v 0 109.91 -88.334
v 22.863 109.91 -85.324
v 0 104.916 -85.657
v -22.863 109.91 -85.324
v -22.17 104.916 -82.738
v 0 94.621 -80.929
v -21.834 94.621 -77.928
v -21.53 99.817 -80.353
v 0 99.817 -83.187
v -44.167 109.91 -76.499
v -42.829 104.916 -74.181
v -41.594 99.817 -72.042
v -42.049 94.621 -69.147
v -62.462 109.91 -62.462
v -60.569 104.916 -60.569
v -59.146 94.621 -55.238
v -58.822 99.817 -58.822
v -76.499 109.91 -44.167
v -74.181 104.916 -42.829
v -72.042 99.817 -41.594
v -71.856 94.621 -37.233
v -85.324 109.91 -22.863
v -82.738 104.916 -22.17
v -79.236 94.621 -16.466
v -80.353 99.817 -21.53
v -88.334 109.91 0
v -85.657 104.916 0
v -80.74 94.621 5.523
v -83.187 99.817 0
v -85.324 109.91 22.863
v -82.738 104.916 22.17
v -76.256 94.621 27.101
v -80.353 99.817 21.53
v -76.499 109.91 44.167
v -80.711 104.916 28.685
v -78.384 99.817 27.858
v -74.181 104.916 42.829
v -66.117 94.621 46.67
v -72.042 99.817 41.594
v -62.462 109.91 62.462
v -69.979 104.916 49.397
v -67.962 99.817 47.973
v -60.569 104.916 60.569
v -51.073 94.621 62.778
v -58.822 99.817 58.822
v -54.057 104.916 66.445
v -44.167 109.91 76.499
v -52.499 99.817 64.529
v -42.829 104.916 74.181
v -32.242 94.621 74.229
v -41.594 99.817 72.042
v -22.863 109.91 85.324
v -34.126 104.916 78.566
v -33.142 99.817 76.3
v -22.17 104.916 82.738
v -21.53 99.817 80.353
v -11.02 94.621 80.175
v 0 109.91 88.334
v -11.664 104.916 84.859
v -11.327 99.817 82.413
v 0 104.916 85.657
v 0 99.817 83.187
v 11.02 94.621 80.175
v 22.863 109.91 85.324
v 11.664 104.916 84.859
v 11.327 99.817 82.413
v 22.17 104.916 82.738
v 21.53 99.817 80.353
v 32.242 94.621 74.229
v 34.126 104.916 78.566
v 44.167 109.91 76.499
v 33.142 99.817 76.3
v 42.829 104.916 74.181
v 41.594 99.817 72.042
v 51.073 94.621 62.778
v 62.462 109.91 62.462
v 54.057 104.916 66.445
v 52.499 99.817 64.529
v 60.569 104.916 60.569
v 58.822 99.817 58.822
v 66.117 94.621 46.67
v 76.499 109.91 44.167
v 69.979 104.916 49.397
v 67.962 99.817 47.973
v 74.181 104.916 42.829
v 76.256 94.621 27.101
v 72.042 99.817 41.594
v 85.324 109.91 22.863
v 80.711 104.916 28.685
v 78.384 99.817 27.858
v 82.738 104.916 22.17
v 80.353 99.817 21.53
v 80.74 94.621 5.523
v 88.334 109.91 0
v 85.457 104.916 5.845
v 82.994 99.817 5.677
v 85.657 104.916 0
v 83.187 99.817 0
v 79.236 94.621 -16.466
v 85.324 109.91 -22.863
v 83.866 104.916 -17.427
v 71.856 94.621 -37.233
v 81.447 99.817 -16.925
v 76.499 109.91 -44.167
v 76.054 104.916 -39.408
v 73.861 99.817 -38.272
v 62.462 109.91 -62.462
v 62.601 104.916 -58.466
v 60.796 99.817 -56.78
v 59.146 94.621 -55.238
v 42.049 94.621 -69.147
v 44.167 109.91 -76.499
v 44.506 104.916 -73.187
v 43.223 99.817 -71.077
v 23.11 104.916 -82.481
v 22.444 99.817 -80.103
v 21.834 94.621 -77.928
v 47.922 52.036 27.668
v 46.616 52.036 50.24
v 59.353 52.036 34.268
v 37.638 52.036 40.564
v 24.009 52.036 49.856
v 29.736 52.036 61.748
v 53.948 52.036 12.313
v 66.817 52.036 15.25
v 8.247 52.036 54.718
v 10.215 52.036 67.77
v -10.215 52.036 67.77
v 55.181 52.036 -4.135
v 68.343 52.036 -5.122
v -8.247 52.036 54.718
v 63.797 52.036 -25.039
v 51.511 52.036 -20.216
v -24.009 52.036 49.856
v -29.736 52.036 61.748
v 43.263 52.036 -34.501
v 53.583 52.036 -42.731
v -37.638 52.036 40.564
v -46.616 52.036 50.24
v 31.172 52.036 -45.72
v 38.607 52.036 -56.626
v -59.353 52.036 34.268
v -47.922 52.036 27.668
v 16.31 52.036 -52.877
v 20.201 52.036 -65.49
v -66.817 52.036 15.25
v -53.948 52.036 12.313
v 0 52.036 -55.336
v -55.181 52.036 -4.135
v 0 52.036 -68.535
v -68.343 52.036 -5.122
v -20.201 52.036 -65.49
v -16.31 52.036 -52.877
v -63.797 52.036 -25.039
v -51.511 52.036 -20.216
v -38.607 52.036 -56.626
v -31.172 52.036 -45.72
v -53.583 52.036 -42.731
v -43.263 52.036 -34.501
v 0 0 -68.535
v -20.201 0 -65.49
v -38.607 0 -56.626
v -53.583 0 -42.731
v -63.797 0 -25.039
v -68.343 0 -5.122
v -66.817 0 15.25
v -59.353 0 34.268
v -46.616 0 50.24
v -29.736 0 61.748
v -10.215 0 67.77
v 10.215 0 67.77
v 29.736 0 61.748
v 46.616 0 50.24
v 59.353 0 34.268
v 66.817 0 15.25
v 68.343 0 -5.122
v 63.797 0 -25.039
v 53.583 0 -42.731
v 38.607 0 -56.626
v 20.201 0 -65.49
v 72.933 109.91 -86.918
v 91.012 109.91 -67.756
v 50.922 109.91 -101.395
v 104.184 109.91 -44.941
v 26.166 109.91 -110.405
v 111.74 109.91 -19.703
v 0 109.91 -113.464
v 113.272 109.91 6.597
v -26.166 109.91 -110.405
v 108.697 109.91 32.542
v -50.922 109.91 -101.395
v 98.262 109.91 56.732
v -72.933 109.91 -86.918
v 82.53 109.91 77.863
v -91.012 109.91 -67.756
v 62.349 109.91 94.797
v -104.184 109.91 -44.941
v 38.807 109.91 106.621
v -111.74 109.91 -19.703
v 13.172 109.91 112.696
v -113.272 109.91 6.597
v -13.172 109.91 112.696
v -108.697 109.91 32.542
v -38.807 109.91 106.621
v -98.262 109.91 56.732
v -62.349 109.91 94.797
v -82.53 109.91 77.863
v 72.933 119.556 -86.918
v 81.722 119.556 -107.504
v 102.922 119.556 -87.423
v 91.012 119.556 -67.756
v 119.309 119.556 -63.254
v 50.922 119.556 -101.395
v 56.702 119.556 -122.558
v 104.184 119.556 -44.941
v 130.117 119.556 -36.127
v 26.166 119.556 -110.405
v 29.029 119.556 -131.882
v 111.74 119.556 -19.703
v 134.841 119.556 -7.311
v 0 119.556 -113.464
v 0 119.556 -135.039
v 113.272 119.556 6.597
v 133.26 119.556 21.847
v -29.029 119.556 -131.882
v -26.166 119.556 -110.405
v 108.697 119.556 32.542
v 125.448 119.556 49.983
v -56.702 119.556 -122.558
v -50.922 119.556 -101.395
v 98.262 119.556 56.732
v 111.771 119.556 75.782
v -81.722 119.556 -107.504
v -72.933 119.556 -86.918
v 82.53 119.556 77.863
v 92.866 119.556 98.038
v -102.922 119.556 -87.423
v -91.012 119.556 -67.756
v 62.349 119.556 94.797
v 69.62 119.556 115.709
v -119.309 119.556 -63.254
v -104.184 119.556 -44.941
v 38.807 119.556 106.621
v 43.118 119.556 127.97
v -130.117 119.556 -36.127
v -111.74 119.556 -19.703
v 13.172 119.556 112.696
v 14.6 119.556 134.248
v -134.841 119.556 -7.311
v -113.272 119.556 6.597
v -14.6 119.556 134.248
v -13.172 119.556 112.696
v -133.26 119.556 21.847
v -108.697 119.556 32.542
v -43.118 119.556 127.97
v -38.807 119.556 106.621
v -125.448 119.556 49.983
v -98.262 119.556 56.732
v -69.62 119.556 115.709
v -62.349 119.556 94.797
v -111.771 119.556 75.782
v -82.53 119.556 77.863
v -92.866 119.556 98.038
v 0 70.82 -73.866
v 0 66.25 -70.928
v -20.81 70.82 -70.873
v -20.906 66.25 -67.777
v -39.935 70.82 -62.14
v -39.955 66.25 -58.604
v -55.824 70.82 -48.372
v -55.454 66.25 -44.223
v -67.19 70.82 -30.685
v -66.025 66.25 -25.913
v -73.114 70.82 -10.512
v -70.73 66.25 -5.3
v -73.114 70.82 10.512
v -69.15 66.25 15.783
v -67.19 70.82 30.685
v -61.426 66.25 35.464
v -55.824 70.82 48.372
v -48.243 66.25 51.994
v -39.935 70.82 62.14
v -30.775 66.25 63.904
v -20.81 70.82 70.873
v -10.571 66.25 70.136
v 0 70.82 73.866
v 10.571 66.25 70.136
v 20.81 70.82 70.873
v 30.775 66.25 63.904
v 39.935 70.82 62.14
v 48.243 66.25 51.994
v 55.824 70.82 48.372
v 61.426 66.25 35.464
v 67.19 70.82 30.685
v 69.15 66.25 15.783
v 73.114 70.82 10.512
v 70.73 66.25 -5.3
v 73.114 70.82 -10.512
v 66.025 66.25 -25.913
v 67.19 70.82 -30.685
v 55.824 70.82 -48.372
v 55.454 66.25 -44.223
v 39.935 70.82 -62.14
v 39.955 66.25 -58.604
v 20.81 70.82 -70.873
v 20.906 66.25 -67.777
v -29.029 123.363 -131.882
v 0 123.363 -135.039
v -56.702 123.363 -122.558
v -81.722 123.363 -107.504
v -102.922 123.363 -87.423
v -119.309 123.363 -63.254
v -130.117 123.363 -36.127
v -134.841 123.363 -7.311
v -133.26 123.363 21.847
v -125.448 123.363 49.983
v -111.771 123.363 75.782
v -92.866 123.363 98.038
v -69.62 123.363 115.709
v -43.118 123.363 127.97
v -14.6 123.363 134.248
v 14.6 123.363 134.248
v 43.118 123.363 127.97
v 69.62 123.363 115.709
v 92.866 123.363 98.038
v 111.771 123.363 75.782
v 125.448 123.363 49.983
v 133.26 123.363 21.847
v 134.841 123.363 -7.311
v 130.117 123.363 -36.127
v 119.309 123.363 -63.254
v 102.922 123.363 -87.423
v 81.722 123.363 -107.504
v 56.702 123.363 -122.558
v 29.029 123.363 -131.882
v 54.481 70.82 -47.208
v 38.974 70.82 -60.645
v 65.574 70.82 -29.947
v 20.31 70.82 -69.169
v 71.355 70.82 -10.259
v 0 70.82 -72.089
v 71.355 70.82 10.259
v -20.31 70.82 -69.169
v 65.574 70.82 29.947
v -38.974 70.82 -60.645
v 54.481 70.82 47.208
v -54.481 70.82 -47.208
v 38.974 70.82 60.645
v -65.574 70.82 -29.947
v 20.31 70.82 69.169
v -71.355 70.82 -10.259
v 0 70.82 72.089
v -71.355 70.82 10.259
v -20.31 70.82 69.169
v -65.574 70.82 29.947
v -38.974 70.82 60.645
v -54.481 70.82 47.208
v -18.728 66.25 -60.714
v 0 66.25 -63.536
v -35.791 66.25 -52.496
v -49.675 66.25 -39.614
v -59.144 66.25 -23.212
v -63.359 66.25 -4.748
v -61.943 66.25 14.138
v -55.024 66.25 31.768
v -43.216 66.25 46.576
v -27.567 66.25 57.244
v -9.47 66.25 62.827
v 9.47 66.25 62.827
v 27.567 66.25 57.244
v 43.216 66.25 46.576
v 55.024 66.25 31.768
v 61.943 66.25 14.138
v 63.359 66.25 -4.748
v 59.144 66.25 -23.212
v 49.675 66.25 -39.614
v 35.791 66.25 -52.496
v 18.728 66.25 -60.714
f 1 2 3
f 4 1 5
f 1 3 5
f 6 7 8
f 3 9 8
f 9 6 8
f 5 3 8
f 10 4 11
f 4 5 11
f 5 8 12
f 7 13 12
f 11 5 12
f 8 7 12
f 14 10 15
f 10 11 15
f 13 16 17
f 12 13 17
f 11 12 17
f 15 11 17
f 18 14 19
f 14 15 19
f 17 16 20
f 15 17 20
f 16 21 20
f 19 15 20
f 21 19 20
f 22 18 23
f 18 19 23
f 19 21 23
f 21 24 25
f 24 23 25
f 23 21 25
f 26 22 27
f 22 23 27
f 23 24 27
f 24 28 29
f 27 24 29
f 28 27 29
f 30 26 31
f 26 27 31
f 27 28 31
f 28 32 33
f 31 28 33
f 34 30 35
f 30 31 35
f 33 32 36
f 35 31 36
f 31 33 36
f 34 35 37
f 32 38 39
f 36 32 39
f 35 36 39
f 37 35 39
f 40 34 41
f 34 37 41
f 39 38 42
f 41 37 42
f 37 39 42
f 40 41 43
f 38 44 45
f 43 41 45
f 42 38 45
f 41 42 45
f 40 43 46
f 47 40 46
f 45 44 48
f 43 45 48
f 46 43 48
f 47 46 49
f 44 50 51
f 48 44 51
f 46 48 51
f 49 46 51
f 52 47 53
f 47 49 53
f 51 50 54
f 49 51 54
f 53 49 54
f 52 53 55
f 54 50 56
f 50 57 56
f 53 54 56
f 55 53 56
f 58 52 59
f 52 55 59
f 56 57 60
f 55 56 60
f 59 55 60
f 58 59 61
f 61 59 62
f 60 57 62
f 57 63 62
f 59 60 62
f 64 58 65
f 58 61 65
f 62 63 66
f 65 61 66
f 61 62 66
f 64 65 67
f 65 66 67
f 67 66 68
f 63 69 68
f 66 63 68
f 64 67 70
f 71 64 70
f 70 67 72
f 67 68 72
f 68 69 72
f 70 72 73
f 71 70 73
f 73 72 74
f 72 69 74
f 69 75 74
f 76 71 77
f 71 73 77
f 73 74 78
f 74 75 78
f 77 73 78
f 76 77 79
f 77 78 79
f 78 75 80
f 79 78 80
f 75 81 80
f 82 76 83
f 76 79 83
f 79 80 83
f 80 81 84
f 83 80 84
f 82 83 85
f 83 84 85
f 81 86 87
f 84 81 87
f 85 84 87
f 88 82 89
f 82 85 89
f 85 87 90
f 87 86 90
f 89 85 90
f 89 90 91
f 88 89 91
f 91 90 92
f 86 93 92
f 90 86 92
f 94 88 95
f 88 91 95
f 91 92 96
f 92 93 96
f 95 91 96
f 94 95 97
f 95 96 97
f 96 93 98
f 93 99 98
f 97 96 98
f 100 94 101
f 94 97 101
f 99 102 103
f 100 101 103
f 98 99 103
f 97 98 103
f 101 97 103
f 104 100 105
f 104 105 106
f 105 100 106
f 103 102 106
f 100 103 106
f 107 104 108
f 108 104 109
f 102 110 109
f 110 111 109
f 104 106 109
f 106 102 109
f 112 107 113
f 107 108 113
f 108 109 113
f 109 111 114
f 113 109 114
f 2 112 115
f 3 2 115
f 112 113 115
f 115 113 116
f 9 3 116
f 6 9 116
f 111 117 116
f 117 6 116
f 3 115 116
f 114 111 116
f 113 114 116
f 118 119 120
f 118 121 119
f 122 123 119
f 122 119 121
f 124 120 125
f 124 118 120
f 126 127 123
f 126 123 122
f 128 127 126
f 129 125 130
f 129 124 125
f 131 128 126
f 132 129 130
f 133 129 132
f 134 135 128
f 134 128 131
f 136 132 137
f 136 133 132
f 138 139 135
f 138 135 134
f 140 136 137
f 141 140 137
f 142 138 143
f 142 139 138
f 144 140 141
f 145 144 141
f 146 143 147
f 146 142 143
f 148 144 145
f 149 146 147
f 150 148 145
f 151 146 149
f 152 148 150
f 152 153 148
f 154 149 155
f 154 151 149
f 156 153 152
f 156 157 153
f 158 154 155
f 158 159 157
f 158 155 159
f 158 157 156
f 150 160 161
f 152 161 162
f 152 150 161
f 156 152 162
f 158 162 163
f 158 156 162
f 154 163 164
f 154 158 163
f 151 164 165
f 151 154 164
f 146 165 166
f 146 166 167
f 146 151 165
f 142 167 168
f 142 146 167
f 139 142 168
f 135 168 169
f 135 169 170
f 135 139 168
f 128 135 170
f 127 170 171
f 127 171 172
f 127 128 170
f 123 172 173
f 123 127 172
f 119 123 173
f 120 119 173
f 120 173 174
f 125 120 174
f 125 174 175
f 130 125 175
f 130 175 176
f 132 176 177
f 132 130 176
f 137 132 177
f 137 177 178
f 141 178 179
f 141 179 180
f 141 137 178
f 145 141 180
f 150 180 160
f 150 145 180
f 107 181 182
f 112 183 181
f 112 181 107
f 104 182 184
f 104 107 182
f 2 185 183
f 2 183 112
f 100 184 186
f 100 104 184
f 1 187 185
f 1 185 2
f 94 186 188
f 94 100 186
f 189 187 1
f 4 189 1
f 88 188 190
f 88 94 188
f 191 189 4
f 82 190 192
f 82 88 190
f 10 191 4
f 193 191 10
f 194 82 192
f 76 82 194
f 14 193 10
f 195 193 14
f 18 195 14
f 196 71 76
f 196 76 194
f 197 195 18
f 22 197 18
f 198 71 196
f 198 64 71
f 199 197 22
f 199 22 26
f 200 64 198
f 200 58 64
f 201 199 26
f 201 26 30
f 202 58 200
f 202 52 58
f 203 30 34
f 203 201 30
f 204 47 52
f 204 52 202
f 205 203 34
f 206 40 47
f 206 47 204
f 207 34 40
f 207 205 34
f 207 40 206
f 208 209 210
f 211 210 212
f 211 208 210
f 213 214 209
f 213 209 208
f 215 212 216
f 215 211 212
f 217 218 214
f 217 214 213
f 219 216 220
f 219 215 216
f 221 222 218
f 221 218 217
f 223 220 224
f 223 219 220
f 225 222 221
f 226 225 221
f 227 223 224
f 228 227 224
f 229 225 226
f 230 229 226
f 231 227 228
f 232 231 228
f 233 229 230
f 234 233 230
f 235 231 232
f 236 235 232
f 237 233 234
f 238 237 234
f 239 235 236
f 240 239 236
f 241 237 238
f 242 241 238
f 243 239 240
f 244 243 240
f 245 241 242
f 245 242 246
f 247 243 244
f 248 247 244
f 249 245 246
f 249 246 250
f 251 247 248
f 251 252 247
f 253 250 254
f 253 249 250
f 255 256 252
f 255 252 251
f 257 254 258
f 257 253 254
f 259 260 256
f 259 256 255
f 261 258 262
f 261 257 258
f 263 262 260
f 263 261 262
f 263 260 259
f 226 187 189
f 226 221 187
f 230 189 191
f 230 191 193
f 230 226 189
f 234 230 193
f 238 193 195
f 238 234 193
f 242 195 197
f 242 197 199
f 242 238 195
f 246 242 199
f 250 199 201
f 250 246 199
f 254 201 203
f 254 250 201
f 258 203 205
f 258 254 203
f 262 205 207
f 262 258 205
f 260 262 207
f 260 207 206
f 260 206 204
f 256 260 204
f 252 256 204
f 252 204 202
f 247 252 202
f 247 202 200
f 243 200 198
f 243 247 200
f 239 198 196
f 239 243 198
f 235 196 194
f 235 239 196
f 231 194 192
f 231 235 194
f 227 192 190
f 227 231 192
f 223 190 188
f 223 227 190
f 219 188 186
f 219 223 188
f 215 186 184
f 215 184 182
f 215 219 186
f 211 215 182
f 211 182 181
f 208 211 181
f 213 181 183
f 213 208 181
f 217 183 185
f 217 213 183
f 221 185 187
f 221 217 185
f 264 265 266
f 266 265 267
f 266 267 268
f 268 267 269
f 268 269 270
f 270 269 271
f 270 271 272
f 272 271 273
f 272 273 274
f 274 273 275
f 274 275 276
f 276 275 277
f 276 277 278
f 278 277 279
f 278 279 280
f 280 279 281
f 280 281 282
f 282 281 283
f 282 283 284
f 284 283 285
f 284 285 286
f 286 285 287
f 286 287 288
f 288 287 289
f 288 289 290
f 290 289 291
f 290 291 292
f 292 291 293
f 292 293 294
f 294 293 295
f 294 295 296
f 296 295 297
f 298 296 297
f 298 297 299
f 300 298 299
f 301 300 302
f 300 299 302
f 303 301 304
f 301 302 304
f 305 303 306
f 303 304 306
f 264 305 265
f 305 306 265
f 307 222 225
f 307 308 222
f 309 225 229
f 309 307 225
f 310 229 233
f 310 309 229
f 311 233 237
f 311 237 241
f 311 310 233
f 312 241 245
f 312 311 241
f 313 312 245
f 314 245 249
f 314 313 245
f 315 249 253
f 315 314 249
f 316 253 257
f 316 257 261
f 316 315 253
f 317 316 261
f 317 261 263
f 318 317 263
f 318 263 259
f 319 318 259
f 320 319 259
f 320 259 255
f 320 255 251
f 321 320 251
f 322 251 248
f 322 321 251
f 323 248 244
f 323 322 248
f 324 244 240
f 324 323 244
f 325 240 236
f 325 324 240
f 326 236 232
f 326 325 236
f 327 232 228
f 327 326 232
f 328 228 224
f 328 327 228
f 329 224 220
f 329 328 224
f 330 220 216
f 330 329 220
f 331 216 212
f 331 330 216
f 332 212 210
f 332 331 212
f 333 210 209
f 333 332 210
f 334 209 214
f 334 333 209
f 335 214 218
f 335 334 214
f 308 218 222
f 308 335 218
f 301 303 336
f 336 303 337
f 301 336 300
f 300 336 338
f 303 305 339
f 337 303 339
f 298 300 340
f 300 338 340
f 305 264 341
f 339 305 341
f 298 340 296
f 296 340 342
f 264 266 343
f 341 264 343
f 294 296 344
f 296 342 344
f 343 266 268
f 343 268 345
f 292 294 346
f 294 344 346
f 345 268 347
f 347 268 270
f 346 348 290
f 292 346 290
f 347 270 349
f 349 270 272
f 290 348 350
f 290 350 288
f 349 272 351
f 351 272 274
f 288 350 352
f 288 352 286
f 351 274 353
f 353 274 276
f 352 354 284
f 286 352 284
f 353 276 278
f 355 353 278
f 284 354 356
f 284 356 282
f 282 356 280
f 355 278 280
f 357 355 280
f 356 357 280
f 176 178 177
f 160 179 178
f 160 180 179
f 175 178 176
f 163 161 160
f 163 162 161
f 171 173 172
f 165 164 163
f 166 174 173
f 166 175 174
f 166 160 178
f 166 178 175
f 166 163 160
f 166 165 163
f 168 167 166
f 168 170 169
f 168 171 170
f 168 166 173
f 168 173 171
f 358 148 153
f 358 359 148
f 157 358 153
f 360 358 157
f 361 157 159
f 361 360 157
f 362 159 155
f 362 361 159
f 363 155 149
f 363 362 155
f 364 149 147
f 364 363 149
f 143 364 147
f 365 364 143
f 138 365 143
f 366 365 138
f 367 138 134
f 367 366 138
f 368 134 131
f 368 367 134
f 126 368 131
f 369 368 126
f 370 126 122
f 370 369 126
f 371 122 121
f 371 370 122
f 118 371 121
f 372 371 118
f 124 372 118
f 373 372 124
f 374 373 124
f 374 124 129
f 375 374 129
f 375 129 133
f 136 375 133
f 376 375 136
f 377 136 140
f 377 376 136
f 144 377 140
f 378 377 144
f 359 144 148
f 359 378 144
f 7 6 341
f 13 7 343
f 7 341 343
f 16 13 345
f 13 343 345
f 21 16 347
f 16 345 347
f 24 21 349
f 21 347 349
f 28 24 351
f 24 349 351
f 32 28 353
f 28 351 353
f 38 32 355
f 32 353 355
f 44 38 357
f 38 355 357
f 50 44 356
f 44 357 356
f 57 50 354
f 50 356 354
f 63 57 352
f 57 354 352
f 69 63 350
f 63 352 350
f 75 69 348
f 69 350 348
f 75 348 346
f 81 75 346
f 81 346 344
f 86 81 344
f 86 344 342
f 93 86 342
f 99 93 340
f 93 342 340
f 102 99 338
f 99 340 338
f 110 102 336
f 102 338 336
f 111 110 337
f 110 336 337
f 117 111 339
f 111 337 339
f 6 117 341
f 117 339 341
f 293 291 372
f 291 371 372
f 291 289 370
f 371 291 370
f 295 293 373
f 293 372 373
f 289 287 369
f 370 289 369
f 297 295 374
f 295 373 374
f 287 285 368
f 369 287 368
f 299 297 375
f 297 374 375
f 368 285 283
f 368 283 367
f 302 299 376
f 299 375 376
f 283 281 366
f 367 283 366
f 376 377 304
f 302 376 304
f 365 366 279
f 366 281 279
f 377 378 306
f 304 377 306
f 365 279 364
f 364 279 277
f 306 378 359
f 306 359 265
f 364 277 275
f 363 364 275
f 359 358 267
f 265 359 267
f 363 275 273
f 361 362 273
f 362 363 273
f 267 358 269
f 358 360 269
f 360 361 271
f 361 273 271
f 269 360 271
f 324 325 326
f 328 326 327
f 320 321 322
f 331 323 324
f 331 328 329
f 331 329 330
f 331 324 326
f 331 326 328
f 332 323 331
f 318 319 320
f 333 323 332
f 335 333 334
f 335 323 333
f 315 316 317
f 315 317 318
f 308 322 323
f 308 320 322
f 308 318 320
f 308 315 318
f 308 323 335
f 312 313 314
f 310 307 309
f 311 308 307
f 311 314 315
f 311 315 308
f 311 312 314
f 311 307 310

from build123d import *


with BuildPart() as part:
    # Sketch2 → Revolve1 (revolve)
    with BuildSketch(Plane.XY):
        Polygon((24.875666667, 0), (68.535, 0), (68.535, 52.035833333), (55.335666667, 52.035833333), (63.536435897, 66.2505), (0, 66.2505), (0, 0), align=None)
    revolve(axis=Axis((0, 0, 0), (0, 1, 0)))

    # Sketch3 → Revolve2 (revolve)
    with BuildSketch(Plane.XY):
        with BuildLine():
            Line((80.92907592, 94.620601836), (72.088666667, 70.8195))
            Line((72.088666667, 70.8195), (73.8655, 70.8195))
            Line((73.8655, 70.8195), (70.928285714, 66.2505))
            Line((70.928285714, 66.2505), (0, 66.2505))
            Line((0, 66.2505), (0, 109.909833333))
            Line((0, 109.909833333), (88.334, 109.909833333))
            ThreePointArc((88.334, 109.909833333), (84.396122366, 102.379234735), (80.92907592, 94.620601836))
        make_face()
    revolve(axis=Axis((0, 0, 0), (0, 1, 0)))

    # Sketch5 → Revolve3 (revolve)
    with BuildSketch(Plane.XY):
        Polygon((0, 109.909833333), (113.4635, 109.909833333), (113.4635, 119.5555), (135.039333333, 119.5555), (135.039333333, 123.363), (0, 123.363), align=None)
    revolve(axis=Axis((0, 0, 0), (0, 1, 0)))


solid = part.part
